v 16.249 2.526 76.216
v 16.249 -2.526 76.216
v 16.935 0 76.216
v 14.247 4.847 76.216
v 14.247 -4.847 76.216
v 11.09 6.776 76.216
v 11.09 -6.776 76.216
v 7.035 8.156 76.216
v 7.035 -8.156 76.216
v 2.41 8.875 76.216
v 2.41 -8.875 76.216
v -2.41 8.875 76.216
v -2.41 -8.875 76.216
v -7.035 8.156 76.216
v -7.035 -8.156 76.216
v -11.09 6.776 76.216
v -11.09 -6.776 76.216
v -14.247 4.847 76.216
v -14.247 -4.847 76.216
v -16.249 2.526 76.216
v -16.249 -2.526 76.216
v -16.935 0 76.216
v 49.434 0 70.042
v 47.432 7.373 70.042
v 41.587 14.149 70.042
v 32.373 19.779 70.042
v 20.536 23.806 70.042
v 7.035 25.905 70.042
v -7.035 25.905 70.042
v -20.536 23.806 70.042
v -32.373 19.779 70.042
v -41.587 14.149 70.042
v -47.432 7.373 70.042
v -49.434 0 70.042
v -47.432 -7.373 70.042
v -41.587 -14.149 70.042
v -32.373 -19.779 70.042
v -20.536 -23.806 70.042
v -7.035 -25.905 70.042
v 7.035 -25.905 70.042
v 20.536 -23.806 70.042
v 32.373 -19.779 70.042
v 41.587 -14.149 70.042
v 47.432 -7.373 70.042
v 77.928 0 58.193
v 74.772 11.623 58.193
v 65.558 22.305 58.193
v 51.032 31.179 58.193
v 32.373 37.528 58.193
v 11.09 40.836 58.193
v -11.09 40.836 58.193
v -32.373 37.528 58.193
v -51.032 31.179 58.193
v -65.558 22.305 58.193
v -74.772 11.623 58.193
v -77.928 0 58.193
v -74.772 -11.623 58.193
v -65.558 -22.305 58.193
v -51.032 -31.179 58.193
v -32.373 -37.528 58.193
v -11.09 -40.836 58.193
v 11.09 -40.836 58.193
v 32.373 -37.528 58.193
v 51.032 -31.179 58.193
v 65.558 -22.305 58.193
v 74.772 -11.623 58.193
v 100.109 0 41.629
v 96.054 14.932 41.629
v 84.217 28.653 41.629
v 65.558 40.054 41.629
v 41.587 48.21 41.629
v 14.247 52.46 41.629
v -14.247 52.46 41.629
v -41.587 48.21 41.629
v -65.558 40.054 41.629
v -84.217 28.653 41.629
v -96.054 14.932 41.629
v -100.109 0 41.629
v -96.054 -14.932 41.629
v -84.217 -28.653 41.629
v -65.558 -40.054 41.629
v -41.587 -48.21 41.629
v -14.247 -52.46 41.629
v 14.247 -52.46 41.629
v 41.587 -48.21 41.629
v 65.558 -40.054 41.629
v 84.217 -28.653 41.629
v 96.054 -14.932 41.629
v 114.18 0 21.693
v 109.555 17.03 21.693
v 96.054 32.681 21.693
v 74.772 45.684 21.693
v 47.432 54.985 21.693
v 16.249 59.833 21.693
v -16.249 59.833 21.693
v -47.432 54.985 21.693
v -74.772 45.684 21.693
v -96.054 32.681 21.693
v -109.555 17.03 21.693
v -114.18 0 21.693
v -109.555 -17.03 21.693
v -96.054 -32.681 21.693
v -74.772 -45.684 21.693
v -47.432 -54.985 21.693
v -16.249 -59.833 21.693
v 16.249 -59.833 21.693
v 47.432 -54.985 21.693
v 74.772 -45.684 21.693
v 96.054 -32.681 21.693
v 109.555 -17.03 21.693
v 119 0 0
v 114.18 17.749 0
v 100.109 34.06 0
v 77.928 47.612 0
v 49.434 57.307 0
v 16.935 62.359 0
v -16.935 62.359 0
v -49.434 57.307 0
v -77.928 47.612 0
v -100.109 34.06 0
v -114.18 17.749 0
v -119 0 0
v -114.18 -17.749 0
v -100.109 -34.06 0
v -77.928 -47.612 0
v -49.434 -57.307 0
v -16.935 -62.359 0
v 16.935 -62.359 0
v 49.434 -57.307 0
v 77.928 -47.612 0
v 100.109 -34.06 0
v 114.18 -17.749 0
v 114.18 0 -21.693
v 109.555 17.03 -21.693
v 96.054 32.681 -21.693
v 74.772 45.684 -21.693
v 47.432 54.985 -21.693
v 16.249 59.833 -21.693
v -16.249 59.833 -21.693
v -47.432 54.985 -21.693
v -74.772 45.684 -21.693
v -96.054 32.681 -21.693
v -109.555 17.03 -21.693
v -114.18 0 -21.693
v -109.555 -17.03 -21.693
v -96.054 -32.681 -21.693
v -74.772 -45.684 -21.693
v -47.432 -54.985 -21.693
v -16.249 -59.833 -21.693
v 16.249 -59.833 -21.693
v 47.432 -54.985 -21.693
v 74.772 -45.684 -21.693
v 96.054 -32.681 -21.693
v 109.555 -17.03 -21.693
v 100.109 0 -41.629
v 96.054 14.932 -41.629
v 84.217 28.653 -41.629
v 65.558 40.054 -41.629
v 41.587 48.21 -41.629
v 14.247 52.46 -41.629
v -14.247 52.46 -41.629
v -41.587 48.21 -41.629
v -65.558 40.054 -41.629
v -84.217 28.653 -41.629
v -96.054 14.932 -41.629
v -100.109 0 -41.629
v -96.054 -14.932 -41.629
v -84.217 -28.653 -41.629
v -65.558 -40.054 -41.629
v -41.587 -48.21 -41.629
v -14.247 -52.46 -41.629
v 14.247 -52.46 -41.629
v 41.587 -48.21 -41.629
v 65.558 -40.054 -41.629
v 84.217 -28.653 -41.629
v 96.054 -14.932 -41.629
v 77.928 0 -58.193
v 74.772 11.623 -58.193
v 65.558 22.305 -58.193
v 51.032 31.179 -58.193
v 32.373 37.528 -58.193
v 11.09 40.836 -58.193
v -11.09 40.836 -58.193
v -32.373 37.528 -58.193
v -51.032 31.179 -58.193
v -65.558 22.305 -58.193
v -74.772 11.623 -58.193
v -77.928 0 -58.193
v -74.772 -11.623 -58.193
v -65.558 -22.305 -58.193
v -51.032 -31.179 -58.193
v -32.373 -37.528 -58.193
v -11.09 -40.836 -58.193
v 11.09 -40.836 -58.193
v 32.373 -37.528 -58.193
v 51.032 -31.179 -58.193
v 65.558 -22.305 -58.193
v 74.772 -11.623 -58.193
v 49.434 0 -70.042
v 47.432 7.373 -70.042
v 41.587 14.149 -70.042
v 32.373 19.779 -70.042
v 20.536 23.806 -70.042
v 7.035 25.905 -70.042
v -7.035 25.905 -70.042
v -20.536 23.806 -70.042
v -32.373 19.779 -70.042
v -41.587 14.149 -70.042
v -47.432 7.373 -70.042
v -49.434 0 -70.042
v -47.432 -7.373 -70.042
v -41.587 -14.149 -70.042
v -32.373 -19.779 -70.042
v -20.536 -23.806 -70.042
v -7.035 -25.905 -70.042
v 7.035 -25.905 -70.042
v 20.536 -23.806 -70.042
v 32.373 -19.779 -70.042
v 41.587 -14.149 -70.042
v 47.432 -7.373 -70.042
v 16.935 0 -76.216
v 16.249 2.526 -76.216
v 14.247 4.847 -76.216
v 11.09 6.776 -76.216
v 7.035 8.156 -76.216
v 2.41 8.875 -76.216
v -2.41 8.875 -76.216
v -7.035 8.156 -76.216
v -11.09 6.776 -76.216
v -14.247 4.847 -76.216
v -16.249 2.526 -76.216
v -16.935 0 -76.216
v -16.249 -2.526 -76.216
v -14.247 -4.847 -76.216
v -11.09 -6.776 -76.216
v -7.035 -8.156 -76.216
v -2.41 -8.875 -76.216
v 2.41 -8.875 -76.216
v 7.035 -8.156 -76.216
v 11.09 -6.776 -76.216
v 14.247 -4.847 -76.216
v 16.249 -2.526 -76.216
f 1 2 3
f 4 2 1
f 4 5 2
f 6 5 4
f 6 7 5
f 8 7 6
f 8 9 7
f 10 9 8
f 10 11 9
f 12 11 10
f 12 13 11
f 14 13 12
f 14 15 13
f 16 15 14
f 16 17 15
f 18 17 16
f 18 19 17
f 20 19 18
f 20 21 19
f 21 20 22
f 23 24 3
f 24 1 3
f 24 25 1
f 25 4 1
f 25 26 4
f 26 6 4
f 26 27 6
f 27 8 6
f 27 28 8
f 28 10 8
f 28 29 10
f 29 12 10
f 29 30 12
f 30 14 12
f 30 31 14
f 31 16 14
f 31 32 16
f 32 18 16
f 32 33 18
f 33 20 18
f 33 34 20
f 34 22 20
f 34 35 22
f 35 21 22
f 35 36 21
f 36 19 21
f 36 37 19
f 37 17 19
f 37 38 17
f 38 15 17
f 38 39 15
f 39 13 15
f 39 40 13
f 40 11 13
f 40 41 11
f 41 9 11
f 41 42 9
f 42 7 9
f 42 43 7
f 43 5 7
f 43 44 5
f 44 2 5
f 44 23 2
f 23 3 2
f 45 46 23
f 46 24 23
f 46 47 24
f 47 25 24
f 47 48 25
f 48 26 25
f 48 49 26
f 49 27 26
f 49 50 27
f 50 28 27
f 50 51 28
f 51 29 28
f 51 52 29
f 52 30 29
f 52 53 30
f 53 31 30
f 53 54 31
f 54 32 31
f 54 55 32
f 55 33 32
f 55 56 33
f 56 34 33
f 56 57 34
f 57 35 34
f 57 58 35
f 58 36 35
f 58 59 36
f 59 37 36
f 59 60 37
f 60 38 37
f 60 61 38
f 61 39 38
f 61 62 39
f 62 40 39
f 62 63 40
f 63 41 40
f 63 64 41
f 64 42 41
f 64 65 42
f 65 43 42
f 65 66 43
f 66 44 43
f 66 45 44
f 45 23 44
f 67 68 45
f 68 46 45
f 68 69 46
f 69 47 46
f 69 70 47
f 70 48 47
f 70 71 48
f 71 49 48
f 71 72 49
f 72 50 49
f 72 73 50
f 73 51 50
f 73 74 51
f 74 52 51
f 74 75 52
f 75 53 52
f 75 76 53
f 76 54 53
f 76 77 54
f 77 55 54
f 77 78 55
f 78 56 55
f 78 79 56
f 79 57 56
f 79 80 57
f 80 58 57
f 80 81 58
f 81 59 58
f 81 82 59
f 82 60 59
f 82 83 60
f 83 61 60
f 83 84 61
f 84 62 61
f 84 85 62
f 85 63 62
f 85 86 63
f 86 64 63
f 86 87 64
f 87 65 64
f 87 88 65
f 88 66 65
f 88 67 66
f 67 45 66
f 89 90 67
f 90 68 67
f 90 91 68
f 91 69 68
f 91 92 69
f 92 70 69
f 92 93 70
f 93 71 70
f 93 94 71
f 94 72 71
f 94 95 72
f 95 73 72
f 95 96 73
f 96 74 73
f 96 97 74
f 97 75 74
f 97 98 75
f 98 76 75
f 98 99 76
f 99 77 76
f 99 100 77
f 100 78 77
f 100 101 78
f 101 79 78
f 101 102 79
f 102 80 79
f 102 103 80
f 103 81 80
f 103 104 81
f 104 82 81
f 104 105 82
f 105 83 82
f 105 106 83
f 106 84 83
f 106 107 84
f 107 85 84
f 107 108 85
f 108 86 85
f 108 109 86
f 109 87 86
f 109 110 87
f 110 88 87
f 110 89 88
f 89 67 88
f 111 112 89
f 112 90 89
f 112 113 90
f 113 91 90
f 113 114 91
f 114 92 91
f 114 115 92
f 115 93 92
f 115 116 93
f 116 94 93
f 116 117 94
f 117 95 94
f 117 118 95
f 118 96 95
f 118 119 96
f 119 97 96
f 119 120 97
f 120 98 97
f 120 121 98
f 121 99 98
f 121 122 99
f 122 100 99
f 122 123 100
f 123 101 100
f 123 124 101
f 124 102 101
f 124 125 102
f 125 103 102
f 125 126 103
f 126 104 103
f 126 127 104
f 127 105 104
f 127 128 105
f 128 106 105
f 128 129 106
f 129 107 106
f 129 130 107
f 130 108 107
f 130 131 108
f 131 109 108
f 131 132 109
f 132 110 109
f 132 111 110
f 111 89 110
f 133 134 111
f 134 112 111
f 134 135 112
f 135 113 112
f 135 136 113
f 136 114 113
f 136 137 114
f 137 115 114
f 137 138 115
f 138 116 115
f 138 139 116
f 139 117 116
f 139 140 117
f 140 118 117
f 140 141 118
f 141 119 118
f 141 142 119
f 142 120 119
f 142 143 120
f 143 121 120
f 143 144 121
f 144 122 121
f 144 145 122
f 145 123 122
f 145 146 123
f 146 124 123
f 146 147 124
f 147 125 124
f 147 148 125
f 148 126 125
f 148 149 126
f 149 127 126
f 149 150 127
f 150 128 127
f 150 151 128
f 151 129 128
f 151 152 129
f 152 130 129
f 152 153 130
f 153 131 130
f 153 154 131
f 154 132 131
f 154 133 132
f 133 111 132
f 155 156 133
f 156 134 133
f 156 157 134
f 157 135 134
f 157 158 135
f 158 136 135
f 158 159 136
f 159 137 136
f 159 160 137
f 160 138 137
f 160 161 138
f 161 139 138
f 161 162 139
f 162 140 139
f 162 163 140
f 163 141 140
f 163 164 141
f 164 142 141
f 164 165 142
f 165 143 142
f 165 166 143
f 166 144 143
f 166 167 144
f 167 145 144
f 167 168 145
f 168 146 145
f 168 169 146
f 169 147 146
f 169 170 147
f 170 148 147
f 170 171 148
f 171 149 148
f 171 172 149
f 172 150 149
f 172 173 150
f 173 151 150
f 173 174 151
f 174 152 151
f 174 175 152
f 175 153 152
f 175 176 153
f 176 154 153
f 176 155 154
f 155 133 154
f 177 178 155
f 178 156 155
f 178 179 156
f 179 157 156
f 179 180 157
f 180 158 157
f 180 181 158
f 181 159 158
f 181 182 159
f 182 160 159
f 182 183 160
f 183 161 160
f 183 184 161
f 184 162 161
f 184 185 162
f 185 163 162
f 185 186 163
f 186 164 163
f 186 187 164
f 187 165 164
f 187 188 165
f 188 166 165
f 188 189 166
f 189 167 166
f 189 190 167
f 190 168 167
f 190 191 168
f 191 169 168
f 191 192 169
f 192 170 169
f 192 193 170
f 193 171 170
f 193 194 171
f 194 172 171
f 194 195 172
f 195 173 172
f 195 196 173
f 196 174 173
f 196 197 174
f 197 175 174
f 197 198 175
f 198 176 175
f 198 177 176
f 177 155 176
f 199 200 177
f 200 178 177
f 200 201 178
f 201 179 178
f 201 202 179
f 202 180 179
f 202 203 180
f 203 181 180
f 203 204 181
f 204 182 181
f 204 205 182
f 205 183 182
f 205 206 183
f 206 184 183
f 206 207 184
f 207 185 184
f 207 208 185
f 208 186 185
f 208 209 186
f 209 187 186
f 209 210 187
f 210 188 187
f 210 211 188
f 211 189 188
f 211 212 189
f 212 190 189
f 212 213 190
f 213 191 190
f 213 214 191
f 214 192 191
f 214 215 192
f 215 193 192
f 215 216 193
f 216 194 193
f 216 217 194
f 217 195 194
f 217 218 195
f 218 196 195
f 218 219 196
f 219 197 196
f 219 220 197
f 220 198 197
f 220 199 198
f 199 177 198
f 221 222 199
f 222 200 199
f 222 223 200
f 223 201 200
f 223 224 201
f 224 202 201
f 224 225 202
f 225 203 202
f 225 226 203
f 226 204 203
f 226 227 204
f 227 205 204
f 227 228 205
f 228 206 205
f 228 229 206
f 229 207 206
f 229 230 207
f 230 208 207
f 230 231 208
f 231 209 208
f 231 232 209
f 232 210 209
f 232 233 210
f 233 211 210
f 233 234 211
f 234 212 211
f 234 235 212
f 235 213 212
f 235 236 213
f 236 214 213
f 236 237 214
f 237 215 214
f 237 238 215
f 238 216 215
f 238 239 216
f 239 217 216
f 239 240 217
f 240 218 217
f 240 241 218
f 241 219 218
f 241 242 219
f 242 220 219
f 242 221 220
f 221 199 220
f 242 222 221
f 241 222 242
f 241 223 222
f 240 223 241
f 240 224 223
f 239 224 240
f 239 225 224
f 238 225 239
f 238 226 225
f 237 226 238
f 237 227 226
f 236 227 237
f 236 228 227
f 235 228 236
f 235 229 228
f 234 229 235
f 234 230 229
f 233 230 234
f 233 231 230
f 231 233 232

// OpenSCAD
// Generated by SolidPython 1.0.1 on 2020-07-29 00:46:53


scale(v = [17, 9, 11]) {
	sphere(r = 7);
}
/***********************************************
*********      SolidPython code:      **********
************************************************
 
# import packages: SolidPython
from solid import *
from solid.utils import *
from itertools import chain, combinations, permutations


class Resize:

    def __init__(self, scad_file):
        self.scad_file = scad_file
        #self.scad_file = import_scad(scad_file)
        # cone/cylinder param:
        self.r1 = 0
        self.r2 = 0
        self.h = 0
        # rectangular prism param:
        self.w = 0
        self.l = 0
        # ellipse param:
        self.r = 0

    # import OpenScad code (file name corresponds to shape)


    # classify shape + parameters
    def assign(self, param1, param2, param3):
        if self.scad_file == 'cone.scad':
            self.r1 = param1
            self.r2 = param2
            self.h = param3
        elif self.scad_file == 'cylinder.scad':
            self.r1 = param1
            self.r2 = param2
            self.h = param3
        elif self.scad_file == 'rectangularPrism.scad':
            self.h = param1
            self.l = param2
            self.w = param3
        else:
            self.r = param1
            self.h = param2

    # resize parameters
    def iterate(self):
        x = range(3, 20, 2)
        i = 1
        if self.scad_file == 'cone.scad':
            tempList = list(permutations(x, 2))
            for temp in tempList:
                param1 = temp[0]
                param2 = temp[1]
                filepath = 'produced_scad_files/' + 'cone' + str(param1) + '_' + str(param2) + '_' + '.scad'
                scad_render_to_file(cylinder(h=param1, r1=param2, r2=0), filepath)

        elif self.scad_file == 'cylinder.scad':
            tempList = list(permutations(x, 3))
            for temp in tempList:
                param1 = temp[0]
                param2 = temp[1]
                filepath = 'produced_scad_files/' + 'cylinder' + str(param1) + '_' + str(param2) + '_' + '.scad'
                scad_render_to_file(cylinder(h=param1, r1=param2, r2=param2), filepath)

        elif self.scad_file == 'rectangularPrism.scad':
            tempList = list(permutations(x, 3))
            for temp in tempList:
                param1 = temp[0]
                param2 = temp[1]
                param3 = temp[2]
                filepath = 'produced_scad_files/' + 'rectangularPrism' + str(param1) + '_' + str(param2) + '_' + str(
                    param3) + '.scad'
                scad_render_to_file(cube(size=(param1, param2, param3)), filepath)

        elif self.scad_file == 'ellipse.scad':
            tempList = list(permutations(x, 4))
            for temp in tempList:
                param1 = temp[0]
                param2 = temp[1]
                param3 = temp[2]
                param4 = temp[3]
                filepath = 'produced_scad_files/' + 'ellipse' + str(param1) + '_' + str(param2) + '_' + str(param3) + '_' + str(param4) + '.scad'
                scad_render_to_file(scale([param1, param2, param3])(sphere(r=param4)), filepath)

    def render_to_scadfile(self):
        scad_render_to_file(scad, 'example.scad') 
 
************************************************/
